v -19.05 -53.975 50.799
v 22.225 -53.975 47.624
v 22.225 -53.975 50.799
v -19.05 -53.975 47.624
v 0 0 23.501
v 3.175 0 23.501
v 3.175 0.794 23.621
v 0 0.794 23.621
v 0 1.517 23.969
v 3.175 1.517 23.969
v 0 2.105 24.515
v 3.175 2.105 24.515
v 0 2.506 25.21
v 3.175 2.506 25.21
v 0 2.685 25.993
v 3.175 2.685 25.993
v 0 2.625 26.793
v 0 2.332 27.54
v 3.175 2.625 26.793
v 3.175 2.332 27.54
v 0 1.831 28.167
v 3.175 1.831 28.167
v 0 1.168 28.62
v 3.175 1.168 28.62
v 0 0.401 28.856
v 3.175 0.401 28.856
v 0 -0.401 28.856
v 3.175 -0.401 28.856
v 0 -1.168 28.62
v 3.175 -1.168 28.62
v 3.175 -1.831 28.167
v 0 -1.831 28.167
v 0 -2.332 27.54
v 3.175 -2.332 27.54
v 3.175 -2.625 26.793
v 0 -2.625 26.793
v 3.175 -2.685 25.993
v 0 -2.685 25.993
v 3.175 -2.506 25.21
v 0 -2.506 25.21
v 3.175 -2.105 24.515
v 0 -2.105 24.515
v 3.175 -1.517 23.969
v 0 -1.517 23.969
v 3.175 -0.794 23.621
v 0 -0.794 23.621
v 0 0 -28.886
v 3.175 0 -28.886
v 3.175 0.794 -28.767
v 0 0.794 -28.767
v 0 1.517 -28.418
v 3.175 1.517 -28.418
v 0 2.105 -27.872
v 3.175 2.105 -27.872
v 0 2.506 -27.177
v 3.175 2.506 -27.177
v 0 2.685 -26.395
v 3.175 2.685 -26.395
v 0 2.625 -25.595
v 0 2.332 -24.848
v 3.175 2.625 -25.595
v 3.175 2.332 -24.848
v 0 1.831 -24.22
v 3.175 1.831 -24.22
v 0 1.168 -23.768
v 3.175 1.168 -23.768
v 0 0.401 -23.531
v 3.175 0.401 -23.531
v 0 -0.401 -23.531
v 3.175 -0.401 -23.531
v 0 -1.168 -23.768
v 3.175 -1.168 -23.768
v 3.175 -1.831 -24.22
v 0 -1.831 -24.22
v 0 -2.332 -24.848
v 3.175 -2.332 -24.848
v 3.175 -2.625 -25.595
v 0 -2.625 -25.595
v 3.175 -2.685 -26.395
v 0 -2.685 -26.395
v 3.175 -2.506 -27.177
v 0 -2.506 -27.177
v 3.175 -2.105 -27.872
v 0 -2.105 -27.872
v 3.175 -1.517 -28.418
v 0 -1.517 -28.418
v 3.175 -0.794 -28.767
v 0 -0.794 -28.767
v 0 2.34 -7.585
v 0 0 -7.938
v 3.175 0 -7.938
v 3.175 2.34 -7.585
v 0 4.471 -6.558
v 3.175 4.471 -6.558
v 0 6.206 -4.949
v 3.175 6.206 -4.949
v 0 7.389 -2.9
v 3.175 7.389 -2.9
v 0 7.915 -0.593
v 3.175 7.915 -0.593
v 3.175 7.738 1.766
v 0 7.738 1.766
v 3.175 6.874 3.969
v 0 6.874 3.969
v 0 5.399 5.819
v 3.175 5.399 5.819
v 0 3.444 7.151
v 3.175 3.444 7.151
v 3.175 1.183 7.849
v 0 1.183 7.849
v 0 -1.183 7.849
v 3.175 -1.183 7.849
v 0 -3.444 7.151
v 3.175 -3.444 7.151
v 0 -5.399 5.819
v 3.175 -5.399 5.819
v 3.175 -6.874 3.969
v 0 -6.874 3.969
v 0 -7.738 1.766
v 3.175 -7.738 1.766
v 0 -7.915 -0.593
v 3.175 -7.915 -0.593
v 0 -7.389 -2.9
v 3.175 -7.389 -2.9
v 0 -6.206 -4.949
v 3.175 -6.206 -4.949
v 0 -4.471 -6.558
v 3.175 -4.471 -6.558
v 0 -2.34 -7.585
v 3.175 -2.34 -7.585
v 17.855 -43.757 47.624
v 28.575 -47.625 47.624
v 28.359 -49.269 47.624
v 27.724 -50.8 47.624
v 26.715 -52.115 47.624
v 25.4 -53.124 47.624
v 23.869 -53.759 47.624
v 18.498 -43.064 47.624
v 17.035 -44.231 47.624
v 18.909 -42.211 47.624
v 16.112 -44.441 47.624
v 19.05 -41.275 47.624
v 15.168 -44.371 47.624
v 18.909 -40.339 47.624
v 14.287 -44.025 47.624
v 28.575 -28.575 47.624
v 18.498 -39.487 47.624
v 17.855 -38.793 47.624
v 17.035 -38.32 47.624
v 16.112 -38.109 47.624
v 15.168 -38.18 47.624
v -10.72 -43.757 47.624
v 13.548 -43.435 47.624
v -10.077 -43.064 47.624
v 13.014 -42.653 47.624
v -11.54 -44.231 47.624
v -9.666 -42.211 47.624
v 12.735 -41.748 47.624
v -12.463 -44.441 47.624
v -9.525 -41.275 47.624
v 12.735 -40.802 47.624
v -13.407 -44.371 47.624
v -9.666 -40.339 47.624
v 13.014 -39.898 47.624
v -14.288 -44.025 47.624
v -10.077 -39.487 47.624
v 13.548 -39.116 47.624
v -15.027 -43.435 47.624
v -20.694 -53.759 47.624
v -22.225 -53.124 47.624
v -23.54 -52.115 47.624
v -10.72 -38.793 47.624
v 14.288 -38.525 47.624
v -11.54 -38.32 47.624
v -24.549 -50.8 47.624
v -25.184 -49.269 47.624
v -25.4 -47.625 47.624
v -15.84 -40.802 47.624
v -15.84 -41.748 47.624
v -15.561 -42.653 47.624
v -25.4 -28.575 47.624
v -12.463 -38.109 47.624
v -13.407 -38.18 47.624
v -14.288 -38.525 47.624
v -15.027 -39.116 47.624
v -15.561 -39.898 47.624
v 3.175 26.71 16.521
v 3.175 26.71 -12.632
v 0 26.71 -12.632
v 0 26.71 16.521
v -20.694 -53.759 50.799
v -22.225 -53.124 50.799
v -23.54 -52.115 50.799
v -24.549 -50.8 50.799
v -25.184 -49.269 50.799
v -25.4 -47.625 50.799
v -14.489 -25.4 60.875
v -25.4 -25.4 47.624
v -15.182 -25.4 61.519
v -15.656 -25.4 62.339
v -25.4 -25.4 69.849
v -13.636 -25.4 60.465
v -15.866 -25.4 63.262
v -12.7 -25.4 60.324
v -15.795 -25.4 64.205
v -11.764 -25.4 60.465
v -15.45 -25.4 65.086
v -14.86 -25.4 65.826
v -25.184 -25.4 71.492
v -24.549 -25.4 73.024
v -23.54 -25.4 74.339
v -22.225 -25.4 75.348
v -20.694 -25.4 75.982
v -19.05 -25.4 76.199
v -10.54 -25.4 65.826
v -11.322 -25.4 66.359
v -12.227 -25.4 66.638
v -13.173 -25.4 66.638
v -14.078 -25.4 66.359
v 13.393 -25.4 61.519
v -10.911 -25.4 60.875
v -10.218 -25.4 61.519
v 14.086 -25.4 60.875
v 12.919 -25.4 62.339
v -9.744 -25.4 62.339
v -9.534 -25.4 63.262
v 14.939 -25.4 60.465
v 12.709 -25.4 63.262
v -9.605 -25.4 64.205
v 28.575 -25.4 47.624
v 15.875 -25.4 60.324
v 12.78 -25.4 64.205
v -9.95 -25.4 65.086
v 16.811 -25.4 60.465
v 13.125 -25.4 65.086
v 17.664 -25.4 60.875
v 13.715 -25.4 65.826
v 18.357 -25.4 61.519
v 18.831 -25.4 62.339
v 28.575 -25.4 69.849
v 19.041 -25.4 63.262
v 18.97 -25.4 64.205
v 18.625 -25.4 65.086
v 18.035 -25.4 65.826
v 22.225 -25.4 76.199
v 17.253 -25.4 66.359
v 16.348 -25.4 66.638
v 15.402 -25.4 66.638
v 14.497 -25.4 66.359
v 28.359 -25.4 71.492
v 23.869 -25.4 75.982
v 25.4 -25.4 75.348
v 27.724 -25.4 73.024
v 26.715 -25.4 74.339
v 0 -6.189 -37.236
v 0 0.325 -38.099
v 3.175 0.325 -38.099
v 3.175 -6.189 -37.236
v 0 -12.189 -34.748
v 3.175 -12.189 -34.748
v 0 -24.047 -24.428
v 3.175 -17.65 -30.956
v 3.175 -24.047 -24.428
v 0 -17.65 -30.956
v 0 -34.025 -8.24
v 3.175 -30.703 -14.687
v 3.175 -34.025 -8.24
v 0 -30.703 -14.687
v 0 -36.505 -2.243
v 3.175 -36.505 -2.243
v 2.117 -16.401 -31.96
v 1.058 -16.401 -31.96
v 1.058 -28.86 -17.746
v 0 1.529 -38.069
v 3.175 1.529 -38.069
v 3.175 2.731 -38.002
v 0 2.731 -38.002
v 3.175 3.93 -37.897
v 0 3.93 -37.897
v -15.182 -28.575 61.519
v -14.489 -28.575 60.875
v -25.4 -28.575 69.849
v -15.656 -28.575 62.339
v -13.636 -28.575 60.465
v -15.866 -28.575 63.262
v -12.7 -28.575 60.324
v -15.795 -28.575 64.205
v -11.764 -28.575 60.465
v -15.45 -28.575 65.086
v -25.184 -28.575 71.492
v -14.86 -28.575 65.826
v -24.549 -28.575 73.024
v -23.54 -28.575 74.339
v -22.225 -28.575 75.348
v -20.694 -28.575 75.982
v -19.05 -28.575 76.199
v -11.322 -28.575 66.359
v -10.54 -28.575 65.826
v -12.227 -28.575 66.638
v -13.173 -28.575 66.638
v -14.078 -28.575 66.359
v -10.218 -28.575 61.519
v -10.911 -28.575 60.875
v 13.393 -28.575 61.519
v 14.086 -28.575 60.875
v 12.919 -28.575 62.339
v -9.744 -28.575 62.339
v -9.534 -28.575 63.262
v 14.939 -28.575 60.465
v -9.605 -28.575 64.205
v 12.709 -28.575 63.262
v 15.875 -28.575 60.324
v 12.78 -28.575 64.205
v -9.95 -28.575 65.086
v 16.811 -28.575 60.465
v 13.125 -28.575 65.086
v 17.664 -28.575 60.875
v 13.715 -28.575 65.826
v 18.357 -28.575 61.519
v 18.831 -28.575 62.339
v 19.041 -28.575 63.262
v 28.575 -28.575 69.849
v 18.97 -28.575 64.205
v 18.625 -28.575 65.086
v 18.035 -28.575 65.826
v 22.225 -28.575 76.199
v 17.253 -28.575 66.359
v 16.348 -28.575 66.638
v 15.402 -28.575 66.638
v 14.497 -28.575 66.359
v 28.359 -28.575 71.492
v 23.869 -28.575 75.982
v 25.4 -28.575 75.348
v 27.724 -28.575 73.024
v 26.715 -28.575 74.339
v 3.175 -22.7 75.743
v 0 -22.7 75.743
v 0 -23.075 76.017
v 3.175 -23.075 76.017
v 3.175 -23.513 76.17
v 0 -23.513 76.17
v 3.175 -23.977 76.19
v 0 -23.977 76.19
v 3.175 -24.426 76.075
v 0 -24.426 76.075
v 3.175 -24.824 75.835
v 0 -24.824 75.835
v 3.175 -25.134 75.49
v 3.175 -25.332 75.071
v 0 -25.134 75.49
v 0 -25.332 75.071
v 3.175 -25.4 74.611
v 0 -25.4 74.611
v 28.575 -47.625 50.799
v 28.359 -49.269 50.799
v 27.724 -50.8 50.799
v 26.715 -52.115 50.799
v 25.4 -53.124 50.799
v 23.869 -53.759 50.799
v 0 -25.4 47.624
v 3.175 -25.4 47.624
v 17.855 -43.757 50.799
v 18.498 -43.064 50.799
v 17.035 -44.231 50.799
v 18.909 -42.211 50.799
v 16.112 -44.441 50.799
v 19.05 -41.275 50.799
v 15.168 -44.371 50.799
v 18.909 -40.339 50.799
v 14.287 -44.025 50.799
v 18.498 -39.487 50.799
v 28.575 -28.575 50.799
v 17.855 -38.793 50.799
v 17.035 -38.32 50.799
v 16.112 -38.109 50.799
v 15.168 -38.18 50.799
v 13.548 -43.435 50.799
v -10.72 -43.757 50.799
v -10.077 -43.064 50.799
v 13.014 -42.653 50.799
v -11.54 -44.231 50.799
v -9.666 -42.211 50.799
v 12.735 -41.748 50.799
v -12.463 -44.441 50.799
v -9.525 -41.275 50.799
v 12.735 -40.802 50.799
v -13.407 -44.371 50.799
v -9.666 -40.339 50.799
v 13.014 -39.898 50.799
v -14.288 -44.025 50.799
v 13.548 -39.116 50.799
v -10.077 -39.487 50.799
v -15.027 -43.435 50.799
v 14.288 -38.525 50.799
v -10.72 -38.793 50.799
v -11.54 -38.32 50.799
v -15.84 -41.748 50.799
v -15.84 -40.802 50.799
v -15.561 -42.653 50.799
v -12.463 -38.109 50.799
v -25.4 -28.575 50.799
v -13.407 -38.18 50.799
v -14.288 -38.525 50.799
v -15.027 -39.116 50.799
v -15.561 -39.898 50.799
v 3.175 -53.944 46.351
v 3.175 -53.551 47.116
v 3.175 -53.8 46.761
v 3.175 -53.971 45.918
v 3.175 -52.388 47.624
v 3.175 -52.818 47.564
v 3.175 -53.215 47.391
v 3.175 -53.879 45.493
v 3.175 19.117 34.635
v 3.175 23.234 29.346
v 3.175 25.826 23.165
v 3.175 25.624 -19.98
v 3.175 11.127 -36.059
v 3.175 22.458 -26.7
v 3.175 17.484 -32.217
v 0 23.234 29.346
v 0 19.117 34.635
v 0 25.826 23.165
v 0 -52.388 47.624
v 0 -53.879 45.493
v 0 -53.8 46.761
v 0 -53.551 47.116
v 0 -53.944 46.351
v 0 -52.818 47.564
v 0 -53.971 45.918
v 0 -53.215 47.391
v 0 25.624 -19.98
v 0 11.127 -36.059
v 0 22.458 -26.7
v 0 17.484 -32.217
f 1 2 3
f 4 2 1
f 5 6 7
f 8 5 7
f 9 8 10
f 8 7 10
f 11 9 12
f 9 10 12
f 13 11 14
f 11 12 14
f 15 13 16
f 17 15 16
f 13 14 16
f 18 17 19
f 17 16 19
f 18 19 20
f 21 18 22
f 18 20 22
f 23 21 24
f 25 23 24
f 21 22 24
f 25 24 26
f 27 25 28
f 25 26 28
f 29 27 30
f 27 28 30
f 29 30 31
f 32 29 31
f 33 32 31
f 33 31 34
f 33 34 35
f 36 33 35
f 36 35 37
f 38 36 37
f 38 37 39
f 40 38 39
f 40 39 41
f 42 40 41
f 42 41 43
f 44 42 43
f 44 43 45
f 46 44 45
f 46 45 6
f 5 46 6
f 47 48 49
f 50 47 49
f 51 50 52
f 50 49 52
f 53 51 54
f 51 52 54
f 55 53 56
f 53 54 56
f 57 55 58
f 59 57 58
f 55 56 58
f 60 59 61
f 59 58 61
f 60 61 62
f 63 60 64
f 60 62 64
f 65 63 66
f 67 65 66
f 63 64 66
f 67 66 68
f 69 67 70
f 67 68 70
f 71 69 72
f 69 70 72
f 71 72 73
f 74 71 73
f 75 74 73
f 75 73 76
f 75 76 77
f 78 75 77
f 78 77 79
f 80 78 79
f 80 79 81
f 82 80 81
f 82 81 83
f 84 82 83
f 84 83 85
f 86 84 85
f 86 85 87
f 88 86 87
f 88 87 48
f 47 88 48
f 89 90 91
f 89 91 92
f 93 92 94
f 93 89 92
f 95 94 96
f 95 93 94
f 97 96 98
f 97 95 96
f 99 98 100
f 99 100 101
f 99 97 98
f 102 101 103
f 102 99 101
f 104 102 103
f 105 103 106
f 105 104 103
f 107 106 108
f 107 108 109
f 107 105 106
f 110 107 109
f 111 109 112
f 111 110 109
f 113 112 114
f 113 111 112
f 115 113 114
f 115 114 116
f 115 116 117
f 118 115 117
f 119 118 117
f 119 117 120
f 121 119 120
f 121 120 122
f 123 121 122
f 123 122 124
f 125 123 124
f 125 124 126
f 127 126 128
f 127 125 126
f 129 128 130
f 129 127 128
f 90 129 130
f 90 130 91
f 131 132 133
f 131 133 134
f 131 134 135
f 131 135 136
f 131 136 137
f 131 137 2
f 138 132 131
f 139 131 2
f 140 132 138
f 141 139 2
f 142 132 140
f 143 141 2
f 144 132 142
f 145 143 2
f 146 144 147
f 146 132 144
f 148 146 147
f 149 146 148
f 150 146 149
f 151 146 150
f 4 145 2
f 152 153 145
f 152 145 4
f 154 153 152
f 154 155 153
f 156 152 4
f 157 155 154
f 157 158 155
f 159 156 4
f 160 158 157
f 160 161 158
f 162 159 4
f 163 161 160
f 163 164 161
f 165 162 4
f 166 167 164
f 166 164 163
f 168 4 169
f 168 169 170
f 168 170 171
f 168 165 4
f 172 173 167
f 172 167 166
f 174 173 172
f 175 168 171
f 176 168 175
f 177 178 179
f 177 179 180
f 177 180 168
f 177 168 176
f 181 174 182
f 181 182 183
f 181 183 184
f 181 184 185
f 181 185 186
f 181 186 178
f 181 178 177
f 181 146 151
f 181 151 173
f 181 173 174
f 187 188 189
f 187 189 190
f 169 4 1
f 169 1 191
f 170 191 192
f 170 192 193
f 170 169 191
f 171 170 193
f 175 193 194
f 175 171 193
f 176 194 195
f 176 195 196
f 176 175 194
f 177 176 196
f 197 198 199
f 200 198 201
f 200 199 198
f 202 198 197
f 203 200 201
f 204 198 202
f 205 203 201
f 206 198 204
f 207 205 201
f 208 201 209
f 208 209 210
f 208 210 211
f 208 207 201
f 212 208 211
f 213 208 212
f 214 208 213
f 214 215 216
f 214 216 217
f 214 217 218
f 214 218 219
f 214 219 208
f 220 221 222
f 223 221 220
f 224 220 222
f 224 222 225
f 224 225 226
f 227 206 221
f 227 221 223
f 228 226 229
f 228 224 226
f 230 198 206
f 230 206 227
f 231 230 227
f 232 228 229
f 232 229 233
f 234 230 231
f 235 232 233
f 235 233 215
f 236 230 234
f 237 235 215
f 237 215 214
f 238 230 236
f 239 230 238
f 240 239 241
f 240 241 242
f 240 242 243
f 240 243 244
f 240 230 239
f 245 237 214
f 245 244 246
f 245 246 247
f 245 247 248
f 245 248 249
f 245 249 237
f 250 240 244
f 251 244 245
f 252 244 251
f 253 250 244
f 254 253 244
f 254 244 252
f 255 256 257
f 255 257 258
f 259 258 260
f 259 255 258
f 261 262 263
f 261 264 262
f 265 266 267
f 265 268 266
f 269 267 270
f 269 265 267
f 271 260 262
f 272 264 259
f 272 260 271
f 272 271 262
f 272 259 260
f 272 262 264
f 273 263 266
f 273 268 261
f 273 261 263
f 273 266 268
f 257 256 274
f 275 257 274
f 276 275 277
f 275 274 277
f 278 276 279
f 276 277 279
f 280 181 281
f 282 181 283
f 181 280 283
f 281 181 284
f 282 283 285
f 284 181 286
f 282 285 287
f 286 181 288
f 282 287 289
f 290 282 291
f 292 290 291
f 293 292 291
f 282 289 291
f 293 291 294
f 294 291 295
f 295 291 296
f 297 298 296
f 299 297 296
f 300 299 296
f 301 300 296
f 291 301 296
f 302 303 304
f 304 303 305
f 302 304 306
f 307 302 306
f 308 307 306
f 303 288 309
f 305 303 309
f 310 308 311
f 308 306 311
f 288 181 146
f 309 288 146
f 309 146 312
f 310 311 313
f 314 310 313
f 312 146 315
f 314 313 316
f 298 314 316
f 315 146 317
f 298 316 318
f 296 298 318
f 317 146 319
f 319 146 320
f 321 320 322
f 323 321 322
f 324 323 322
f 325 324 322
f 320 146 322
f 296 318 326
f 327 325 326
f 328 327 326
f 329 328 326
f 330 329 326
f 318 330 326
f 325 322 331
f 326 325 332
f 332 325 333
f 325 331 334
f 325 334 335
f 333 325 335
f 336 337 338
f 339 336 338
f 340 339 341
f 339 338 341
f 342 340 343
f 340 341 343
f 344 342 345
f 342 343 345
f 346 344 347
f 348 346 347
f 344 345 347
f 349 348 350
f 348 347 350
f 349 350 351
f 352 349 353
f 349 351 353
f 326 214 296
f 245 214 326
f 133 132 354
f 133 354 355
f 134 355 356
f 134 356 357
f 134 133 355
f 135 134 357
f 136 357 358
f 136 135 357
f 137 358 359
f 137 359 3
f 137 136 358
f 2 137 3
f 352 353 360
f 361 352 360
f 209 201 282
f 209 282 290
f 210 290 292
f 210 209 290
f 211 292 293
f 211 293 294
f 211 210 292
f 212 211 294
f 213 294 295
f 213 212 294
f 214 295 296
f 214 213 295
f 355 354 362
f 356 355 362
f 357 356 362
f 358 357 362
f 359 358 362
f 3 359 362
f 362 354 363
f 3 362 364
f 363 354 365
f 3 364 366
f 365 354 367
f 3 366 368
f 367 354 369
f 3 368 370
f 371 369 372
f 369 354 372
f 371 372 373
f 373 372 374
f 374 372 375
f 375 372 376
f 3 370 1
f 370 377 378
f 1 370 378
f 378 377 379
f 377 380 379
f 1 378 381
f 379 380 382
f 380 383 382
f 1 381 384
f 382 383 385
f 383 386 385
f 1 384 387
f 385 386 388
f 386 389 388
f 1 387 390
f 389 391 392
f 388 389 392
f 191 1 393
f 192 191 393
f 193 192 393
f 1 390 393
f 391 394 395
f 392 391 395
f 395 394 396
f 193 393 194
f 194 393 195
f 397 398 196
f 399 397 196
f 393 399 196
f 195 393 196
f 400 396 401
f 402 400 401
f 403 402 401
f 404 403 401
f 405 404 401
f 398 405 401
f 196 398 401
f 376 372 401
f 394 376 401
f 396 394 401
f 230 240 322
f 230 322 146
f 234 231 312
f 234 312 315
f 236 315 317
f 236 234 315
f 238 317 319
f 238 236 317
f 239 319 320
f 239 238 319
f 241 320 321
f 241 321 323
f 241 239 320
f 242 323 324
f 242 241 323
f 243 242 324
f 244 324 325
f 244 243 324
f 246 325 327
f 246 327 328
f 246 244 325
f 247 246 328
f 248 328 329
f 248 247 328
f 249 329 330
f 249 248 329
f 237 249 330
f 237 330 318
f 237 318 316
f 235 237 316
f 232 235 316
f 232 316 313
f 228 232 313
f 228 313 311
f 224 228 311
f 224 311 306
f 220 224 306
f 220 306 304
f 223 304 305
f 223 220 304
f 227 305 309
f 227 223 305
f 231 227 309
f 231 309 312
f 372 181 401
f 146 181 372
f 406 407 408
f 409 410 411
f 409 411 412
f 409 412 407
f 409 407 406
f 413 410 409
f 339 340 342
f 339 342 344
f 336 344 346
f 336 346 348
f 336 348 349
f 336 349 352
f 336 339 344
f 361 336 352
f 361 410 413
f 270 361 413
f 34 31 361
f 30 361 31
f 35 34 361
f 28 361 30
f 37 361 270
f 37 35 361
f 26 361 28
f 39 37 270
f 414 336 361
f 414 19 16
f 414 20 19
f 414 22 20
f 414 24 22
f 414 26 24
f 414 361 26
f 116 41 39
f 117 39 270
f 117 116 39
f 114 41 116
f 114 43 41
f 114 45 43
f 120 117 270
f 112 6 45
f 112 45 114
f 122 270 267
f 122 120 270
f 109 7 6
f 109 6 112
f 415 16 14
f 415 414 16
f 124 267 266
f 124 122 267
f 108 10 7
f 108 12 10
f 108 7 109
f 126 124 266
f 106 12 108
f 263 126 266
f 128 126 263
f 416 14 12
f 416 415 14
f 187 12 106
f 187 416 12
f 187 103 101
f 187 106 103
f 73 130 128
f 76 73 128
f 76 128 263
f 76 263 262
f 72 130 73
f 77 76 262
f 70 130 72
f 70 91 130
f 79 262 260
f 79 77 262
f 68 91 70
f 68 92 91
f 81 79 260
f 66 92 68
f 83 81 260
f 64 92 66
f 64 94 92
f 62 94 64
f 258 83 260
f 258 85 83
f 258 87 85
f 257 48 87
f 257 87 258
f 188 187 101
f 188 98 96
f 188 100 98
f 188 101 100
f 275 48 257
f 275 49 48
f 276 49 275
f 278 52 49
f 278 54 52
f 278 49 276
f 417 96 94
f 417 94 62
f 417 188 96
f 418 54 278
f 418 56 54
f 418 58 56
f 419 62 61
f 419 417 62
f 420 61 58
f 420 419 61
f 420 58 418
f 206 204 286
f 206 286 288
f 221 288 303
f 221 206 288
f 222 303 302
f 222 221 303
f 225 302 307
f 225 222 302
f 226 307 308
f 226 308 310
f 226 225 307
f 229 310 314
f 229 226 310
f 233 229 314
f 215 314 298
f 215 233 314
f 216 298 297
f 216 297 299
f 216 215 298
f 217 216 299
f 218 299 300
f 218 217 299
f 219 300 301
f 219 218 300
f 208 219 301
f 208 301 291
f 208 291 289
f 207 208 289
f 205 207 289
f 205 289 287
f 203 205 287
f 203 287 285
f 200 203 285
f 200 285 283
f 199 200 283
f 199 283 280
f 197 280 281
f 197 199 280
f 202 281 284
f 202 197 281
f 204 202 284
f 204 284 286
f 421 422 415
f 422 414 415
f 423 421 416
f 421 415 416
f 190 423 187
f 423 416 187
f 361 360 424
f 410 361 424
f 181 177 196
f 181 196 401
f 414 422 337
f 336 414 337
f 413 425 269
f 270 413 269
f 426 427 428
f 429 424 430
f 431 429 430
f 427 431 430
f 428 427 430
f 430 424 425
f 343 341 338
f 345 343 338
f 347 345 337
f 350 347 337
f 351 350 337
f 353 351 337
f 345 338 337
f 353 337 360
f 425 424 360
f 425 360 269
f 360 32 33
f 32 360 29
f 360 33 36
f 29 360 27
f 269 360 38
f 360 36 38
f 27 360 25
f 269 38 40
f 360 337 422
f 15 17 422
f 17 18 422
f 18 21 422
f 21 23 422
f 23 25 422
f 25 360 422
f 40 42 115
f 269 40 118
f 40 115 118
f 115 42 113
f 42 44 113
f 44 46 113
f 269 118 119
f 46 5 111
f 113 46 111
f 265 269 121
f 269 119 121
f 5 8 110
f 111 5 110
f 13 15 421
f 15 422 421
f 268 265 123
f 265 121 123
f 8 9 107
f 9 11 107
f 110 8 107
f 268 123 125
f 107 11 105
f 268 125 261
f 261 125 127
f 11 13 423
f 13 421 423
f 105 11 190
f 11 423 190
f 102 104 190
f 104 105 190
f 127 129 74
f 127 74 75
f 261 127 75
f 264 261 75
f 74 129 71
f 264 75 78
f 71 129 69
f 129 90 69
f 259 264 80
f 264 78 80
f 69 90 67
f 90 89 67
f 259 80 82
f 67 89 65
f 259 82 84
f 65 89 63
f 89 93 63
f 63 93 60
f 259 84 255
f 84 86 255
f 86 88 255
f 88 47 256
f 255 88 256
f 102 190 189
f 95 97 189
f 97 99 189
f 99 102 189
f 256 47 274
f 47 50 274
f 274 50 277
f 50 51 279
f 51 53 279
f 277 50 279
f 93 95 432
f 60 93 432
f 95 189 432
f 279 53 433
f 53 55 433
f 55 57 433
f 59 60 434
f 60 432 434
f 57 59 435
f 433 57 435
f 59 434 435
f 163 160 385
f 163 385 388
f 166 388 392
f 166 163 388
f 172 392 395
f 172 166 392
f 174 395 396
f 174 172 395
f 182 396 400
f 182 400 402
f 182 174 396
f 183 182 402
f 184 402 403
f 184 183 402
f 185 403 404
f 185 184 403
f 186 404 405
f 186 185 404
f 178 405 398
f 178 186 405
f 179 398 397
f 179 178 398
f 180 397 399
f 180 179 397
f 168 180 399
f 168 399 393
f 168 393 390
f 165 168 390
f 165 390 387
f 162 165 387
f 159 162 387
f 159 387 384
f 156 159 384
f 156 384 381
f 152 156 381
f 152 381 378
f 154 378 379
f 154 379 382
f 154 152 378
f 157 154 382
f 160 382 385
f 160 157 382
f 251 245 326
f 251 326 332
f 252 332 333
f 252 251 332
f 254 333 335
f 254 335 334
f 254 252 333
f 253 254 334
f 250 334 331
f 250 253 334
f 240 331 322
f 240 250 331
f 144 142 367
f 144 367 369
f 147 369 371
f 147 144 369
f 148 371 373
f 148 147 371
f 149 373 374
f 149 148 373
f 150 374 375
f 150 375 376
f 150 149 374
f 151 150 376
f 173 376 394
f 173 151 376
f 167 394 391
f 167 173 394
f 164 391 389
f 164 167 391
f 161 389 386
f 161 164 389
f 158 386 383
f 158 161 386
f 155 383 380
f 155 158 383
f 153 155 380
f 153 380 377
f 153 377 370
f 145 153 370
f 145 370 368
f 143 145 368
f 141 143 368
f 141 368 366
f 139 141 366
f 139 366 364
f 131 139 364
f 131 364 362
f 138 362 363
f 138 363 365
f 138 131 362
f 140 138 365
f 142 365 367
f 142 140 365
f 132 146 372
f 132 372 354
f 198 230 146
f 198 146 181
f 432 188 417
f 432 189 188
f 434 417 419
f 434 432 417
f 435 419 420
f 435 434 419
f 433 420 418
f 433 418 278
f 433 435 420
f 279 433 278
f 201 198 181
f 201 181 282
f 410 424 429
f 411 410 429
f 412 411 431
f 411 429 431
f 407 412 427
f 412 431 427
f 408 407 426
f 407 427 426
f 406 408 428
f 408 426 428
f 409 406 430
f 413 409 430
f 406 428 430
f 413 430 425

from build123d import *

# Parameters (mm, degrees)
SKETCH1_R           = 7.9375
BOSS_EXTRUDE1_DEPTH = 3.175
SKETCH2_R           = 3.175
BOSS_EXTRUDE2_DEPTH = 3.175
SKETCH3_R           = 3.175
BOSS_EXTRUDE3_DEPTH = 3.175
SKETCH4_R           = 2.6924
CUT_EXTRUDE1_DEPTH  = 29.575
FILLET1_R           = 25.4


with BuildPart() as part:
    # Sketch1 → Boss-Extrude1 (new body)
    with BuildSketch(Plane(origin=(0, 0, 0), x_dir=(0, 0, -1), z_dir=(1, 0, 0))):
        with BuildLine():
            Line((-27.169618094, 26.70995793), (-75.743368037, -22.69971313))
            ThreePointArc((-75.743368037, -22.69971313), (-76.075354693, -24.426388512), (-74.611300617, -25.400128043))
            Line((-74.611300617, -25.400128043), (-47.623800617, -25.400128043))
            Line((-47.623800617, -25.400128043), (-47.623800617, -52.387628043))
            ThreePointArc((-47.623800617, -52.387628043), (-46.946853209, -53.688031914), (-45.493343639, -53.879390079))
            Line((-45.493343639, -53.879390079), (2.243041497, -36.504766798))
            add(Edge.make_bspline(
                [(38.098613574, 0.325028819), (38.257943408, -18.350994418), (16.130398484, -31.450182222), (2.243041497, -36.504766798)],
                knots=[0, 0, 0, 0, 1, 1, 1, 1], degree=3))
            ThreePointArc((38.098613574, 0.325028819), (14.279420738, 35.322912442), (-27.169618094, 26.70995793))
        make_face()
        Circle(SKETCH1_R, mode=Mode.SUBTRACT)
    extrude(amount=BOSS_EXTRUDE1_DEPTH)

    # Sketch4 → Cut-Extrude1 (cut, through all)
    with BuildSketch(Plane(origin=(3.175, 0, 0), x_dir=(0, 0, -1), z_dir=(1, 0, 0))):
        with Locations((-26.19375, 0)):
            Circle(SKETCH4_R)
        with Locations((26.19375, 0)):
            Circle(SKETCH4_R)
        with BuildLine():
            Line((27.169618094, 26.70995793), (-27.169618094, 26.70995793))
            ThreePointArc((-27.169618094, 26.70995793), (0, 38.1), (27.169618094, 26.70995793))
        make_face()
    extrude(amount=-CUT_EXTRUDE1_DEPTH, mode=Mode.SUBTRACT)

    # Fillet1
    fillet1_edges = [part.edges().sort_by_distance(p)[0] for p in [
        (1.5875, 26.70995793, 27.169618094),
        (1.5875, 26.70995793, -27.169618094),
    ]]
    fillet(fillet1_edges, radius=FILLET1_R)


with BuildPart() as body_2:
    # Sketch2 → Boss-Extrude2 (new body)
    with BuildSketch(Plane(origin=(38.098793801, -25.400128043, 0), x_dir=(0, 0, -1), z_dir=(0, -1, 0))):
        with BuildLine():
            Line((-69.848800617, -9.523793801), (-47.623800617, -9.523793801))
            Line((-47.623800617, -9.523793801), (-47.623800617, -63.498793801))
            Line((-47.623800617, -63.498793801), (-69.848800617, -63.498793801))
            ThreePointArc((-69.848800617, -63.498793801), (-74.338928677, -61.638921862), (-76.198800617, -57.148793801))
            Line((-76.198800617, -57.148793801), (-76.198800617, -15.873793801))
            ThreePointArc((-76.198800617, -15.873793801), (-74.338928677, -11.383665741), (-69.848800617, -9.523793801))
        make_face()
        with Locations((-63.498800617, -22.223793801)):
            Circle(SKETCH2_R, mode=Mode.SUBTRACT)
        with Locations((-63.498800617, -50.798793801)):
            Circle(SKETCH2_R, mode=Mode.SUBTRACT)
    extrude(amount=BOSS_EXTRUDE2_DEPTH)


with BuildPart() as body_3:
    # Sketch3 → Boss-Extrude3 (new body)
    with BuildSketch(Plane.XY.offset(47.623800617)):
        with BuildLine():
            Line((-25.4, -28.575128043), (28.575, -28.575128043))
            Line((28.575, -28.575128043), (28.575, -47.625128043))
            ThreePointArc((28.575, -47.625128043), (26.715128061, -52.115256104), (22.225, -53.975128043))
            Line((22.225, -53.975128043), (-19.05, -53.975128043))
            ThreePointArc((-19.05, -53.975128043), (-23.540128061, -52.115256104), (-25.4, -47.625128043))
            Line((-25.4, -47.625128043), (-25.4, -28.575128043))
        make_face()
        with Locations((-12.7, -41.275128043)):
            Circle(SKETCH3_R, mode=Mode.SUBTRACT)
        with Locations((15.875, -41.275128043)):
            Circle(SKETCH3_R, mode=Mode.SUBTRACT)
    extrude(amount=BOSS_EXTRUDE3_DEPTH)


solid = Compound([part.part, body_2.part, body_3.part])
